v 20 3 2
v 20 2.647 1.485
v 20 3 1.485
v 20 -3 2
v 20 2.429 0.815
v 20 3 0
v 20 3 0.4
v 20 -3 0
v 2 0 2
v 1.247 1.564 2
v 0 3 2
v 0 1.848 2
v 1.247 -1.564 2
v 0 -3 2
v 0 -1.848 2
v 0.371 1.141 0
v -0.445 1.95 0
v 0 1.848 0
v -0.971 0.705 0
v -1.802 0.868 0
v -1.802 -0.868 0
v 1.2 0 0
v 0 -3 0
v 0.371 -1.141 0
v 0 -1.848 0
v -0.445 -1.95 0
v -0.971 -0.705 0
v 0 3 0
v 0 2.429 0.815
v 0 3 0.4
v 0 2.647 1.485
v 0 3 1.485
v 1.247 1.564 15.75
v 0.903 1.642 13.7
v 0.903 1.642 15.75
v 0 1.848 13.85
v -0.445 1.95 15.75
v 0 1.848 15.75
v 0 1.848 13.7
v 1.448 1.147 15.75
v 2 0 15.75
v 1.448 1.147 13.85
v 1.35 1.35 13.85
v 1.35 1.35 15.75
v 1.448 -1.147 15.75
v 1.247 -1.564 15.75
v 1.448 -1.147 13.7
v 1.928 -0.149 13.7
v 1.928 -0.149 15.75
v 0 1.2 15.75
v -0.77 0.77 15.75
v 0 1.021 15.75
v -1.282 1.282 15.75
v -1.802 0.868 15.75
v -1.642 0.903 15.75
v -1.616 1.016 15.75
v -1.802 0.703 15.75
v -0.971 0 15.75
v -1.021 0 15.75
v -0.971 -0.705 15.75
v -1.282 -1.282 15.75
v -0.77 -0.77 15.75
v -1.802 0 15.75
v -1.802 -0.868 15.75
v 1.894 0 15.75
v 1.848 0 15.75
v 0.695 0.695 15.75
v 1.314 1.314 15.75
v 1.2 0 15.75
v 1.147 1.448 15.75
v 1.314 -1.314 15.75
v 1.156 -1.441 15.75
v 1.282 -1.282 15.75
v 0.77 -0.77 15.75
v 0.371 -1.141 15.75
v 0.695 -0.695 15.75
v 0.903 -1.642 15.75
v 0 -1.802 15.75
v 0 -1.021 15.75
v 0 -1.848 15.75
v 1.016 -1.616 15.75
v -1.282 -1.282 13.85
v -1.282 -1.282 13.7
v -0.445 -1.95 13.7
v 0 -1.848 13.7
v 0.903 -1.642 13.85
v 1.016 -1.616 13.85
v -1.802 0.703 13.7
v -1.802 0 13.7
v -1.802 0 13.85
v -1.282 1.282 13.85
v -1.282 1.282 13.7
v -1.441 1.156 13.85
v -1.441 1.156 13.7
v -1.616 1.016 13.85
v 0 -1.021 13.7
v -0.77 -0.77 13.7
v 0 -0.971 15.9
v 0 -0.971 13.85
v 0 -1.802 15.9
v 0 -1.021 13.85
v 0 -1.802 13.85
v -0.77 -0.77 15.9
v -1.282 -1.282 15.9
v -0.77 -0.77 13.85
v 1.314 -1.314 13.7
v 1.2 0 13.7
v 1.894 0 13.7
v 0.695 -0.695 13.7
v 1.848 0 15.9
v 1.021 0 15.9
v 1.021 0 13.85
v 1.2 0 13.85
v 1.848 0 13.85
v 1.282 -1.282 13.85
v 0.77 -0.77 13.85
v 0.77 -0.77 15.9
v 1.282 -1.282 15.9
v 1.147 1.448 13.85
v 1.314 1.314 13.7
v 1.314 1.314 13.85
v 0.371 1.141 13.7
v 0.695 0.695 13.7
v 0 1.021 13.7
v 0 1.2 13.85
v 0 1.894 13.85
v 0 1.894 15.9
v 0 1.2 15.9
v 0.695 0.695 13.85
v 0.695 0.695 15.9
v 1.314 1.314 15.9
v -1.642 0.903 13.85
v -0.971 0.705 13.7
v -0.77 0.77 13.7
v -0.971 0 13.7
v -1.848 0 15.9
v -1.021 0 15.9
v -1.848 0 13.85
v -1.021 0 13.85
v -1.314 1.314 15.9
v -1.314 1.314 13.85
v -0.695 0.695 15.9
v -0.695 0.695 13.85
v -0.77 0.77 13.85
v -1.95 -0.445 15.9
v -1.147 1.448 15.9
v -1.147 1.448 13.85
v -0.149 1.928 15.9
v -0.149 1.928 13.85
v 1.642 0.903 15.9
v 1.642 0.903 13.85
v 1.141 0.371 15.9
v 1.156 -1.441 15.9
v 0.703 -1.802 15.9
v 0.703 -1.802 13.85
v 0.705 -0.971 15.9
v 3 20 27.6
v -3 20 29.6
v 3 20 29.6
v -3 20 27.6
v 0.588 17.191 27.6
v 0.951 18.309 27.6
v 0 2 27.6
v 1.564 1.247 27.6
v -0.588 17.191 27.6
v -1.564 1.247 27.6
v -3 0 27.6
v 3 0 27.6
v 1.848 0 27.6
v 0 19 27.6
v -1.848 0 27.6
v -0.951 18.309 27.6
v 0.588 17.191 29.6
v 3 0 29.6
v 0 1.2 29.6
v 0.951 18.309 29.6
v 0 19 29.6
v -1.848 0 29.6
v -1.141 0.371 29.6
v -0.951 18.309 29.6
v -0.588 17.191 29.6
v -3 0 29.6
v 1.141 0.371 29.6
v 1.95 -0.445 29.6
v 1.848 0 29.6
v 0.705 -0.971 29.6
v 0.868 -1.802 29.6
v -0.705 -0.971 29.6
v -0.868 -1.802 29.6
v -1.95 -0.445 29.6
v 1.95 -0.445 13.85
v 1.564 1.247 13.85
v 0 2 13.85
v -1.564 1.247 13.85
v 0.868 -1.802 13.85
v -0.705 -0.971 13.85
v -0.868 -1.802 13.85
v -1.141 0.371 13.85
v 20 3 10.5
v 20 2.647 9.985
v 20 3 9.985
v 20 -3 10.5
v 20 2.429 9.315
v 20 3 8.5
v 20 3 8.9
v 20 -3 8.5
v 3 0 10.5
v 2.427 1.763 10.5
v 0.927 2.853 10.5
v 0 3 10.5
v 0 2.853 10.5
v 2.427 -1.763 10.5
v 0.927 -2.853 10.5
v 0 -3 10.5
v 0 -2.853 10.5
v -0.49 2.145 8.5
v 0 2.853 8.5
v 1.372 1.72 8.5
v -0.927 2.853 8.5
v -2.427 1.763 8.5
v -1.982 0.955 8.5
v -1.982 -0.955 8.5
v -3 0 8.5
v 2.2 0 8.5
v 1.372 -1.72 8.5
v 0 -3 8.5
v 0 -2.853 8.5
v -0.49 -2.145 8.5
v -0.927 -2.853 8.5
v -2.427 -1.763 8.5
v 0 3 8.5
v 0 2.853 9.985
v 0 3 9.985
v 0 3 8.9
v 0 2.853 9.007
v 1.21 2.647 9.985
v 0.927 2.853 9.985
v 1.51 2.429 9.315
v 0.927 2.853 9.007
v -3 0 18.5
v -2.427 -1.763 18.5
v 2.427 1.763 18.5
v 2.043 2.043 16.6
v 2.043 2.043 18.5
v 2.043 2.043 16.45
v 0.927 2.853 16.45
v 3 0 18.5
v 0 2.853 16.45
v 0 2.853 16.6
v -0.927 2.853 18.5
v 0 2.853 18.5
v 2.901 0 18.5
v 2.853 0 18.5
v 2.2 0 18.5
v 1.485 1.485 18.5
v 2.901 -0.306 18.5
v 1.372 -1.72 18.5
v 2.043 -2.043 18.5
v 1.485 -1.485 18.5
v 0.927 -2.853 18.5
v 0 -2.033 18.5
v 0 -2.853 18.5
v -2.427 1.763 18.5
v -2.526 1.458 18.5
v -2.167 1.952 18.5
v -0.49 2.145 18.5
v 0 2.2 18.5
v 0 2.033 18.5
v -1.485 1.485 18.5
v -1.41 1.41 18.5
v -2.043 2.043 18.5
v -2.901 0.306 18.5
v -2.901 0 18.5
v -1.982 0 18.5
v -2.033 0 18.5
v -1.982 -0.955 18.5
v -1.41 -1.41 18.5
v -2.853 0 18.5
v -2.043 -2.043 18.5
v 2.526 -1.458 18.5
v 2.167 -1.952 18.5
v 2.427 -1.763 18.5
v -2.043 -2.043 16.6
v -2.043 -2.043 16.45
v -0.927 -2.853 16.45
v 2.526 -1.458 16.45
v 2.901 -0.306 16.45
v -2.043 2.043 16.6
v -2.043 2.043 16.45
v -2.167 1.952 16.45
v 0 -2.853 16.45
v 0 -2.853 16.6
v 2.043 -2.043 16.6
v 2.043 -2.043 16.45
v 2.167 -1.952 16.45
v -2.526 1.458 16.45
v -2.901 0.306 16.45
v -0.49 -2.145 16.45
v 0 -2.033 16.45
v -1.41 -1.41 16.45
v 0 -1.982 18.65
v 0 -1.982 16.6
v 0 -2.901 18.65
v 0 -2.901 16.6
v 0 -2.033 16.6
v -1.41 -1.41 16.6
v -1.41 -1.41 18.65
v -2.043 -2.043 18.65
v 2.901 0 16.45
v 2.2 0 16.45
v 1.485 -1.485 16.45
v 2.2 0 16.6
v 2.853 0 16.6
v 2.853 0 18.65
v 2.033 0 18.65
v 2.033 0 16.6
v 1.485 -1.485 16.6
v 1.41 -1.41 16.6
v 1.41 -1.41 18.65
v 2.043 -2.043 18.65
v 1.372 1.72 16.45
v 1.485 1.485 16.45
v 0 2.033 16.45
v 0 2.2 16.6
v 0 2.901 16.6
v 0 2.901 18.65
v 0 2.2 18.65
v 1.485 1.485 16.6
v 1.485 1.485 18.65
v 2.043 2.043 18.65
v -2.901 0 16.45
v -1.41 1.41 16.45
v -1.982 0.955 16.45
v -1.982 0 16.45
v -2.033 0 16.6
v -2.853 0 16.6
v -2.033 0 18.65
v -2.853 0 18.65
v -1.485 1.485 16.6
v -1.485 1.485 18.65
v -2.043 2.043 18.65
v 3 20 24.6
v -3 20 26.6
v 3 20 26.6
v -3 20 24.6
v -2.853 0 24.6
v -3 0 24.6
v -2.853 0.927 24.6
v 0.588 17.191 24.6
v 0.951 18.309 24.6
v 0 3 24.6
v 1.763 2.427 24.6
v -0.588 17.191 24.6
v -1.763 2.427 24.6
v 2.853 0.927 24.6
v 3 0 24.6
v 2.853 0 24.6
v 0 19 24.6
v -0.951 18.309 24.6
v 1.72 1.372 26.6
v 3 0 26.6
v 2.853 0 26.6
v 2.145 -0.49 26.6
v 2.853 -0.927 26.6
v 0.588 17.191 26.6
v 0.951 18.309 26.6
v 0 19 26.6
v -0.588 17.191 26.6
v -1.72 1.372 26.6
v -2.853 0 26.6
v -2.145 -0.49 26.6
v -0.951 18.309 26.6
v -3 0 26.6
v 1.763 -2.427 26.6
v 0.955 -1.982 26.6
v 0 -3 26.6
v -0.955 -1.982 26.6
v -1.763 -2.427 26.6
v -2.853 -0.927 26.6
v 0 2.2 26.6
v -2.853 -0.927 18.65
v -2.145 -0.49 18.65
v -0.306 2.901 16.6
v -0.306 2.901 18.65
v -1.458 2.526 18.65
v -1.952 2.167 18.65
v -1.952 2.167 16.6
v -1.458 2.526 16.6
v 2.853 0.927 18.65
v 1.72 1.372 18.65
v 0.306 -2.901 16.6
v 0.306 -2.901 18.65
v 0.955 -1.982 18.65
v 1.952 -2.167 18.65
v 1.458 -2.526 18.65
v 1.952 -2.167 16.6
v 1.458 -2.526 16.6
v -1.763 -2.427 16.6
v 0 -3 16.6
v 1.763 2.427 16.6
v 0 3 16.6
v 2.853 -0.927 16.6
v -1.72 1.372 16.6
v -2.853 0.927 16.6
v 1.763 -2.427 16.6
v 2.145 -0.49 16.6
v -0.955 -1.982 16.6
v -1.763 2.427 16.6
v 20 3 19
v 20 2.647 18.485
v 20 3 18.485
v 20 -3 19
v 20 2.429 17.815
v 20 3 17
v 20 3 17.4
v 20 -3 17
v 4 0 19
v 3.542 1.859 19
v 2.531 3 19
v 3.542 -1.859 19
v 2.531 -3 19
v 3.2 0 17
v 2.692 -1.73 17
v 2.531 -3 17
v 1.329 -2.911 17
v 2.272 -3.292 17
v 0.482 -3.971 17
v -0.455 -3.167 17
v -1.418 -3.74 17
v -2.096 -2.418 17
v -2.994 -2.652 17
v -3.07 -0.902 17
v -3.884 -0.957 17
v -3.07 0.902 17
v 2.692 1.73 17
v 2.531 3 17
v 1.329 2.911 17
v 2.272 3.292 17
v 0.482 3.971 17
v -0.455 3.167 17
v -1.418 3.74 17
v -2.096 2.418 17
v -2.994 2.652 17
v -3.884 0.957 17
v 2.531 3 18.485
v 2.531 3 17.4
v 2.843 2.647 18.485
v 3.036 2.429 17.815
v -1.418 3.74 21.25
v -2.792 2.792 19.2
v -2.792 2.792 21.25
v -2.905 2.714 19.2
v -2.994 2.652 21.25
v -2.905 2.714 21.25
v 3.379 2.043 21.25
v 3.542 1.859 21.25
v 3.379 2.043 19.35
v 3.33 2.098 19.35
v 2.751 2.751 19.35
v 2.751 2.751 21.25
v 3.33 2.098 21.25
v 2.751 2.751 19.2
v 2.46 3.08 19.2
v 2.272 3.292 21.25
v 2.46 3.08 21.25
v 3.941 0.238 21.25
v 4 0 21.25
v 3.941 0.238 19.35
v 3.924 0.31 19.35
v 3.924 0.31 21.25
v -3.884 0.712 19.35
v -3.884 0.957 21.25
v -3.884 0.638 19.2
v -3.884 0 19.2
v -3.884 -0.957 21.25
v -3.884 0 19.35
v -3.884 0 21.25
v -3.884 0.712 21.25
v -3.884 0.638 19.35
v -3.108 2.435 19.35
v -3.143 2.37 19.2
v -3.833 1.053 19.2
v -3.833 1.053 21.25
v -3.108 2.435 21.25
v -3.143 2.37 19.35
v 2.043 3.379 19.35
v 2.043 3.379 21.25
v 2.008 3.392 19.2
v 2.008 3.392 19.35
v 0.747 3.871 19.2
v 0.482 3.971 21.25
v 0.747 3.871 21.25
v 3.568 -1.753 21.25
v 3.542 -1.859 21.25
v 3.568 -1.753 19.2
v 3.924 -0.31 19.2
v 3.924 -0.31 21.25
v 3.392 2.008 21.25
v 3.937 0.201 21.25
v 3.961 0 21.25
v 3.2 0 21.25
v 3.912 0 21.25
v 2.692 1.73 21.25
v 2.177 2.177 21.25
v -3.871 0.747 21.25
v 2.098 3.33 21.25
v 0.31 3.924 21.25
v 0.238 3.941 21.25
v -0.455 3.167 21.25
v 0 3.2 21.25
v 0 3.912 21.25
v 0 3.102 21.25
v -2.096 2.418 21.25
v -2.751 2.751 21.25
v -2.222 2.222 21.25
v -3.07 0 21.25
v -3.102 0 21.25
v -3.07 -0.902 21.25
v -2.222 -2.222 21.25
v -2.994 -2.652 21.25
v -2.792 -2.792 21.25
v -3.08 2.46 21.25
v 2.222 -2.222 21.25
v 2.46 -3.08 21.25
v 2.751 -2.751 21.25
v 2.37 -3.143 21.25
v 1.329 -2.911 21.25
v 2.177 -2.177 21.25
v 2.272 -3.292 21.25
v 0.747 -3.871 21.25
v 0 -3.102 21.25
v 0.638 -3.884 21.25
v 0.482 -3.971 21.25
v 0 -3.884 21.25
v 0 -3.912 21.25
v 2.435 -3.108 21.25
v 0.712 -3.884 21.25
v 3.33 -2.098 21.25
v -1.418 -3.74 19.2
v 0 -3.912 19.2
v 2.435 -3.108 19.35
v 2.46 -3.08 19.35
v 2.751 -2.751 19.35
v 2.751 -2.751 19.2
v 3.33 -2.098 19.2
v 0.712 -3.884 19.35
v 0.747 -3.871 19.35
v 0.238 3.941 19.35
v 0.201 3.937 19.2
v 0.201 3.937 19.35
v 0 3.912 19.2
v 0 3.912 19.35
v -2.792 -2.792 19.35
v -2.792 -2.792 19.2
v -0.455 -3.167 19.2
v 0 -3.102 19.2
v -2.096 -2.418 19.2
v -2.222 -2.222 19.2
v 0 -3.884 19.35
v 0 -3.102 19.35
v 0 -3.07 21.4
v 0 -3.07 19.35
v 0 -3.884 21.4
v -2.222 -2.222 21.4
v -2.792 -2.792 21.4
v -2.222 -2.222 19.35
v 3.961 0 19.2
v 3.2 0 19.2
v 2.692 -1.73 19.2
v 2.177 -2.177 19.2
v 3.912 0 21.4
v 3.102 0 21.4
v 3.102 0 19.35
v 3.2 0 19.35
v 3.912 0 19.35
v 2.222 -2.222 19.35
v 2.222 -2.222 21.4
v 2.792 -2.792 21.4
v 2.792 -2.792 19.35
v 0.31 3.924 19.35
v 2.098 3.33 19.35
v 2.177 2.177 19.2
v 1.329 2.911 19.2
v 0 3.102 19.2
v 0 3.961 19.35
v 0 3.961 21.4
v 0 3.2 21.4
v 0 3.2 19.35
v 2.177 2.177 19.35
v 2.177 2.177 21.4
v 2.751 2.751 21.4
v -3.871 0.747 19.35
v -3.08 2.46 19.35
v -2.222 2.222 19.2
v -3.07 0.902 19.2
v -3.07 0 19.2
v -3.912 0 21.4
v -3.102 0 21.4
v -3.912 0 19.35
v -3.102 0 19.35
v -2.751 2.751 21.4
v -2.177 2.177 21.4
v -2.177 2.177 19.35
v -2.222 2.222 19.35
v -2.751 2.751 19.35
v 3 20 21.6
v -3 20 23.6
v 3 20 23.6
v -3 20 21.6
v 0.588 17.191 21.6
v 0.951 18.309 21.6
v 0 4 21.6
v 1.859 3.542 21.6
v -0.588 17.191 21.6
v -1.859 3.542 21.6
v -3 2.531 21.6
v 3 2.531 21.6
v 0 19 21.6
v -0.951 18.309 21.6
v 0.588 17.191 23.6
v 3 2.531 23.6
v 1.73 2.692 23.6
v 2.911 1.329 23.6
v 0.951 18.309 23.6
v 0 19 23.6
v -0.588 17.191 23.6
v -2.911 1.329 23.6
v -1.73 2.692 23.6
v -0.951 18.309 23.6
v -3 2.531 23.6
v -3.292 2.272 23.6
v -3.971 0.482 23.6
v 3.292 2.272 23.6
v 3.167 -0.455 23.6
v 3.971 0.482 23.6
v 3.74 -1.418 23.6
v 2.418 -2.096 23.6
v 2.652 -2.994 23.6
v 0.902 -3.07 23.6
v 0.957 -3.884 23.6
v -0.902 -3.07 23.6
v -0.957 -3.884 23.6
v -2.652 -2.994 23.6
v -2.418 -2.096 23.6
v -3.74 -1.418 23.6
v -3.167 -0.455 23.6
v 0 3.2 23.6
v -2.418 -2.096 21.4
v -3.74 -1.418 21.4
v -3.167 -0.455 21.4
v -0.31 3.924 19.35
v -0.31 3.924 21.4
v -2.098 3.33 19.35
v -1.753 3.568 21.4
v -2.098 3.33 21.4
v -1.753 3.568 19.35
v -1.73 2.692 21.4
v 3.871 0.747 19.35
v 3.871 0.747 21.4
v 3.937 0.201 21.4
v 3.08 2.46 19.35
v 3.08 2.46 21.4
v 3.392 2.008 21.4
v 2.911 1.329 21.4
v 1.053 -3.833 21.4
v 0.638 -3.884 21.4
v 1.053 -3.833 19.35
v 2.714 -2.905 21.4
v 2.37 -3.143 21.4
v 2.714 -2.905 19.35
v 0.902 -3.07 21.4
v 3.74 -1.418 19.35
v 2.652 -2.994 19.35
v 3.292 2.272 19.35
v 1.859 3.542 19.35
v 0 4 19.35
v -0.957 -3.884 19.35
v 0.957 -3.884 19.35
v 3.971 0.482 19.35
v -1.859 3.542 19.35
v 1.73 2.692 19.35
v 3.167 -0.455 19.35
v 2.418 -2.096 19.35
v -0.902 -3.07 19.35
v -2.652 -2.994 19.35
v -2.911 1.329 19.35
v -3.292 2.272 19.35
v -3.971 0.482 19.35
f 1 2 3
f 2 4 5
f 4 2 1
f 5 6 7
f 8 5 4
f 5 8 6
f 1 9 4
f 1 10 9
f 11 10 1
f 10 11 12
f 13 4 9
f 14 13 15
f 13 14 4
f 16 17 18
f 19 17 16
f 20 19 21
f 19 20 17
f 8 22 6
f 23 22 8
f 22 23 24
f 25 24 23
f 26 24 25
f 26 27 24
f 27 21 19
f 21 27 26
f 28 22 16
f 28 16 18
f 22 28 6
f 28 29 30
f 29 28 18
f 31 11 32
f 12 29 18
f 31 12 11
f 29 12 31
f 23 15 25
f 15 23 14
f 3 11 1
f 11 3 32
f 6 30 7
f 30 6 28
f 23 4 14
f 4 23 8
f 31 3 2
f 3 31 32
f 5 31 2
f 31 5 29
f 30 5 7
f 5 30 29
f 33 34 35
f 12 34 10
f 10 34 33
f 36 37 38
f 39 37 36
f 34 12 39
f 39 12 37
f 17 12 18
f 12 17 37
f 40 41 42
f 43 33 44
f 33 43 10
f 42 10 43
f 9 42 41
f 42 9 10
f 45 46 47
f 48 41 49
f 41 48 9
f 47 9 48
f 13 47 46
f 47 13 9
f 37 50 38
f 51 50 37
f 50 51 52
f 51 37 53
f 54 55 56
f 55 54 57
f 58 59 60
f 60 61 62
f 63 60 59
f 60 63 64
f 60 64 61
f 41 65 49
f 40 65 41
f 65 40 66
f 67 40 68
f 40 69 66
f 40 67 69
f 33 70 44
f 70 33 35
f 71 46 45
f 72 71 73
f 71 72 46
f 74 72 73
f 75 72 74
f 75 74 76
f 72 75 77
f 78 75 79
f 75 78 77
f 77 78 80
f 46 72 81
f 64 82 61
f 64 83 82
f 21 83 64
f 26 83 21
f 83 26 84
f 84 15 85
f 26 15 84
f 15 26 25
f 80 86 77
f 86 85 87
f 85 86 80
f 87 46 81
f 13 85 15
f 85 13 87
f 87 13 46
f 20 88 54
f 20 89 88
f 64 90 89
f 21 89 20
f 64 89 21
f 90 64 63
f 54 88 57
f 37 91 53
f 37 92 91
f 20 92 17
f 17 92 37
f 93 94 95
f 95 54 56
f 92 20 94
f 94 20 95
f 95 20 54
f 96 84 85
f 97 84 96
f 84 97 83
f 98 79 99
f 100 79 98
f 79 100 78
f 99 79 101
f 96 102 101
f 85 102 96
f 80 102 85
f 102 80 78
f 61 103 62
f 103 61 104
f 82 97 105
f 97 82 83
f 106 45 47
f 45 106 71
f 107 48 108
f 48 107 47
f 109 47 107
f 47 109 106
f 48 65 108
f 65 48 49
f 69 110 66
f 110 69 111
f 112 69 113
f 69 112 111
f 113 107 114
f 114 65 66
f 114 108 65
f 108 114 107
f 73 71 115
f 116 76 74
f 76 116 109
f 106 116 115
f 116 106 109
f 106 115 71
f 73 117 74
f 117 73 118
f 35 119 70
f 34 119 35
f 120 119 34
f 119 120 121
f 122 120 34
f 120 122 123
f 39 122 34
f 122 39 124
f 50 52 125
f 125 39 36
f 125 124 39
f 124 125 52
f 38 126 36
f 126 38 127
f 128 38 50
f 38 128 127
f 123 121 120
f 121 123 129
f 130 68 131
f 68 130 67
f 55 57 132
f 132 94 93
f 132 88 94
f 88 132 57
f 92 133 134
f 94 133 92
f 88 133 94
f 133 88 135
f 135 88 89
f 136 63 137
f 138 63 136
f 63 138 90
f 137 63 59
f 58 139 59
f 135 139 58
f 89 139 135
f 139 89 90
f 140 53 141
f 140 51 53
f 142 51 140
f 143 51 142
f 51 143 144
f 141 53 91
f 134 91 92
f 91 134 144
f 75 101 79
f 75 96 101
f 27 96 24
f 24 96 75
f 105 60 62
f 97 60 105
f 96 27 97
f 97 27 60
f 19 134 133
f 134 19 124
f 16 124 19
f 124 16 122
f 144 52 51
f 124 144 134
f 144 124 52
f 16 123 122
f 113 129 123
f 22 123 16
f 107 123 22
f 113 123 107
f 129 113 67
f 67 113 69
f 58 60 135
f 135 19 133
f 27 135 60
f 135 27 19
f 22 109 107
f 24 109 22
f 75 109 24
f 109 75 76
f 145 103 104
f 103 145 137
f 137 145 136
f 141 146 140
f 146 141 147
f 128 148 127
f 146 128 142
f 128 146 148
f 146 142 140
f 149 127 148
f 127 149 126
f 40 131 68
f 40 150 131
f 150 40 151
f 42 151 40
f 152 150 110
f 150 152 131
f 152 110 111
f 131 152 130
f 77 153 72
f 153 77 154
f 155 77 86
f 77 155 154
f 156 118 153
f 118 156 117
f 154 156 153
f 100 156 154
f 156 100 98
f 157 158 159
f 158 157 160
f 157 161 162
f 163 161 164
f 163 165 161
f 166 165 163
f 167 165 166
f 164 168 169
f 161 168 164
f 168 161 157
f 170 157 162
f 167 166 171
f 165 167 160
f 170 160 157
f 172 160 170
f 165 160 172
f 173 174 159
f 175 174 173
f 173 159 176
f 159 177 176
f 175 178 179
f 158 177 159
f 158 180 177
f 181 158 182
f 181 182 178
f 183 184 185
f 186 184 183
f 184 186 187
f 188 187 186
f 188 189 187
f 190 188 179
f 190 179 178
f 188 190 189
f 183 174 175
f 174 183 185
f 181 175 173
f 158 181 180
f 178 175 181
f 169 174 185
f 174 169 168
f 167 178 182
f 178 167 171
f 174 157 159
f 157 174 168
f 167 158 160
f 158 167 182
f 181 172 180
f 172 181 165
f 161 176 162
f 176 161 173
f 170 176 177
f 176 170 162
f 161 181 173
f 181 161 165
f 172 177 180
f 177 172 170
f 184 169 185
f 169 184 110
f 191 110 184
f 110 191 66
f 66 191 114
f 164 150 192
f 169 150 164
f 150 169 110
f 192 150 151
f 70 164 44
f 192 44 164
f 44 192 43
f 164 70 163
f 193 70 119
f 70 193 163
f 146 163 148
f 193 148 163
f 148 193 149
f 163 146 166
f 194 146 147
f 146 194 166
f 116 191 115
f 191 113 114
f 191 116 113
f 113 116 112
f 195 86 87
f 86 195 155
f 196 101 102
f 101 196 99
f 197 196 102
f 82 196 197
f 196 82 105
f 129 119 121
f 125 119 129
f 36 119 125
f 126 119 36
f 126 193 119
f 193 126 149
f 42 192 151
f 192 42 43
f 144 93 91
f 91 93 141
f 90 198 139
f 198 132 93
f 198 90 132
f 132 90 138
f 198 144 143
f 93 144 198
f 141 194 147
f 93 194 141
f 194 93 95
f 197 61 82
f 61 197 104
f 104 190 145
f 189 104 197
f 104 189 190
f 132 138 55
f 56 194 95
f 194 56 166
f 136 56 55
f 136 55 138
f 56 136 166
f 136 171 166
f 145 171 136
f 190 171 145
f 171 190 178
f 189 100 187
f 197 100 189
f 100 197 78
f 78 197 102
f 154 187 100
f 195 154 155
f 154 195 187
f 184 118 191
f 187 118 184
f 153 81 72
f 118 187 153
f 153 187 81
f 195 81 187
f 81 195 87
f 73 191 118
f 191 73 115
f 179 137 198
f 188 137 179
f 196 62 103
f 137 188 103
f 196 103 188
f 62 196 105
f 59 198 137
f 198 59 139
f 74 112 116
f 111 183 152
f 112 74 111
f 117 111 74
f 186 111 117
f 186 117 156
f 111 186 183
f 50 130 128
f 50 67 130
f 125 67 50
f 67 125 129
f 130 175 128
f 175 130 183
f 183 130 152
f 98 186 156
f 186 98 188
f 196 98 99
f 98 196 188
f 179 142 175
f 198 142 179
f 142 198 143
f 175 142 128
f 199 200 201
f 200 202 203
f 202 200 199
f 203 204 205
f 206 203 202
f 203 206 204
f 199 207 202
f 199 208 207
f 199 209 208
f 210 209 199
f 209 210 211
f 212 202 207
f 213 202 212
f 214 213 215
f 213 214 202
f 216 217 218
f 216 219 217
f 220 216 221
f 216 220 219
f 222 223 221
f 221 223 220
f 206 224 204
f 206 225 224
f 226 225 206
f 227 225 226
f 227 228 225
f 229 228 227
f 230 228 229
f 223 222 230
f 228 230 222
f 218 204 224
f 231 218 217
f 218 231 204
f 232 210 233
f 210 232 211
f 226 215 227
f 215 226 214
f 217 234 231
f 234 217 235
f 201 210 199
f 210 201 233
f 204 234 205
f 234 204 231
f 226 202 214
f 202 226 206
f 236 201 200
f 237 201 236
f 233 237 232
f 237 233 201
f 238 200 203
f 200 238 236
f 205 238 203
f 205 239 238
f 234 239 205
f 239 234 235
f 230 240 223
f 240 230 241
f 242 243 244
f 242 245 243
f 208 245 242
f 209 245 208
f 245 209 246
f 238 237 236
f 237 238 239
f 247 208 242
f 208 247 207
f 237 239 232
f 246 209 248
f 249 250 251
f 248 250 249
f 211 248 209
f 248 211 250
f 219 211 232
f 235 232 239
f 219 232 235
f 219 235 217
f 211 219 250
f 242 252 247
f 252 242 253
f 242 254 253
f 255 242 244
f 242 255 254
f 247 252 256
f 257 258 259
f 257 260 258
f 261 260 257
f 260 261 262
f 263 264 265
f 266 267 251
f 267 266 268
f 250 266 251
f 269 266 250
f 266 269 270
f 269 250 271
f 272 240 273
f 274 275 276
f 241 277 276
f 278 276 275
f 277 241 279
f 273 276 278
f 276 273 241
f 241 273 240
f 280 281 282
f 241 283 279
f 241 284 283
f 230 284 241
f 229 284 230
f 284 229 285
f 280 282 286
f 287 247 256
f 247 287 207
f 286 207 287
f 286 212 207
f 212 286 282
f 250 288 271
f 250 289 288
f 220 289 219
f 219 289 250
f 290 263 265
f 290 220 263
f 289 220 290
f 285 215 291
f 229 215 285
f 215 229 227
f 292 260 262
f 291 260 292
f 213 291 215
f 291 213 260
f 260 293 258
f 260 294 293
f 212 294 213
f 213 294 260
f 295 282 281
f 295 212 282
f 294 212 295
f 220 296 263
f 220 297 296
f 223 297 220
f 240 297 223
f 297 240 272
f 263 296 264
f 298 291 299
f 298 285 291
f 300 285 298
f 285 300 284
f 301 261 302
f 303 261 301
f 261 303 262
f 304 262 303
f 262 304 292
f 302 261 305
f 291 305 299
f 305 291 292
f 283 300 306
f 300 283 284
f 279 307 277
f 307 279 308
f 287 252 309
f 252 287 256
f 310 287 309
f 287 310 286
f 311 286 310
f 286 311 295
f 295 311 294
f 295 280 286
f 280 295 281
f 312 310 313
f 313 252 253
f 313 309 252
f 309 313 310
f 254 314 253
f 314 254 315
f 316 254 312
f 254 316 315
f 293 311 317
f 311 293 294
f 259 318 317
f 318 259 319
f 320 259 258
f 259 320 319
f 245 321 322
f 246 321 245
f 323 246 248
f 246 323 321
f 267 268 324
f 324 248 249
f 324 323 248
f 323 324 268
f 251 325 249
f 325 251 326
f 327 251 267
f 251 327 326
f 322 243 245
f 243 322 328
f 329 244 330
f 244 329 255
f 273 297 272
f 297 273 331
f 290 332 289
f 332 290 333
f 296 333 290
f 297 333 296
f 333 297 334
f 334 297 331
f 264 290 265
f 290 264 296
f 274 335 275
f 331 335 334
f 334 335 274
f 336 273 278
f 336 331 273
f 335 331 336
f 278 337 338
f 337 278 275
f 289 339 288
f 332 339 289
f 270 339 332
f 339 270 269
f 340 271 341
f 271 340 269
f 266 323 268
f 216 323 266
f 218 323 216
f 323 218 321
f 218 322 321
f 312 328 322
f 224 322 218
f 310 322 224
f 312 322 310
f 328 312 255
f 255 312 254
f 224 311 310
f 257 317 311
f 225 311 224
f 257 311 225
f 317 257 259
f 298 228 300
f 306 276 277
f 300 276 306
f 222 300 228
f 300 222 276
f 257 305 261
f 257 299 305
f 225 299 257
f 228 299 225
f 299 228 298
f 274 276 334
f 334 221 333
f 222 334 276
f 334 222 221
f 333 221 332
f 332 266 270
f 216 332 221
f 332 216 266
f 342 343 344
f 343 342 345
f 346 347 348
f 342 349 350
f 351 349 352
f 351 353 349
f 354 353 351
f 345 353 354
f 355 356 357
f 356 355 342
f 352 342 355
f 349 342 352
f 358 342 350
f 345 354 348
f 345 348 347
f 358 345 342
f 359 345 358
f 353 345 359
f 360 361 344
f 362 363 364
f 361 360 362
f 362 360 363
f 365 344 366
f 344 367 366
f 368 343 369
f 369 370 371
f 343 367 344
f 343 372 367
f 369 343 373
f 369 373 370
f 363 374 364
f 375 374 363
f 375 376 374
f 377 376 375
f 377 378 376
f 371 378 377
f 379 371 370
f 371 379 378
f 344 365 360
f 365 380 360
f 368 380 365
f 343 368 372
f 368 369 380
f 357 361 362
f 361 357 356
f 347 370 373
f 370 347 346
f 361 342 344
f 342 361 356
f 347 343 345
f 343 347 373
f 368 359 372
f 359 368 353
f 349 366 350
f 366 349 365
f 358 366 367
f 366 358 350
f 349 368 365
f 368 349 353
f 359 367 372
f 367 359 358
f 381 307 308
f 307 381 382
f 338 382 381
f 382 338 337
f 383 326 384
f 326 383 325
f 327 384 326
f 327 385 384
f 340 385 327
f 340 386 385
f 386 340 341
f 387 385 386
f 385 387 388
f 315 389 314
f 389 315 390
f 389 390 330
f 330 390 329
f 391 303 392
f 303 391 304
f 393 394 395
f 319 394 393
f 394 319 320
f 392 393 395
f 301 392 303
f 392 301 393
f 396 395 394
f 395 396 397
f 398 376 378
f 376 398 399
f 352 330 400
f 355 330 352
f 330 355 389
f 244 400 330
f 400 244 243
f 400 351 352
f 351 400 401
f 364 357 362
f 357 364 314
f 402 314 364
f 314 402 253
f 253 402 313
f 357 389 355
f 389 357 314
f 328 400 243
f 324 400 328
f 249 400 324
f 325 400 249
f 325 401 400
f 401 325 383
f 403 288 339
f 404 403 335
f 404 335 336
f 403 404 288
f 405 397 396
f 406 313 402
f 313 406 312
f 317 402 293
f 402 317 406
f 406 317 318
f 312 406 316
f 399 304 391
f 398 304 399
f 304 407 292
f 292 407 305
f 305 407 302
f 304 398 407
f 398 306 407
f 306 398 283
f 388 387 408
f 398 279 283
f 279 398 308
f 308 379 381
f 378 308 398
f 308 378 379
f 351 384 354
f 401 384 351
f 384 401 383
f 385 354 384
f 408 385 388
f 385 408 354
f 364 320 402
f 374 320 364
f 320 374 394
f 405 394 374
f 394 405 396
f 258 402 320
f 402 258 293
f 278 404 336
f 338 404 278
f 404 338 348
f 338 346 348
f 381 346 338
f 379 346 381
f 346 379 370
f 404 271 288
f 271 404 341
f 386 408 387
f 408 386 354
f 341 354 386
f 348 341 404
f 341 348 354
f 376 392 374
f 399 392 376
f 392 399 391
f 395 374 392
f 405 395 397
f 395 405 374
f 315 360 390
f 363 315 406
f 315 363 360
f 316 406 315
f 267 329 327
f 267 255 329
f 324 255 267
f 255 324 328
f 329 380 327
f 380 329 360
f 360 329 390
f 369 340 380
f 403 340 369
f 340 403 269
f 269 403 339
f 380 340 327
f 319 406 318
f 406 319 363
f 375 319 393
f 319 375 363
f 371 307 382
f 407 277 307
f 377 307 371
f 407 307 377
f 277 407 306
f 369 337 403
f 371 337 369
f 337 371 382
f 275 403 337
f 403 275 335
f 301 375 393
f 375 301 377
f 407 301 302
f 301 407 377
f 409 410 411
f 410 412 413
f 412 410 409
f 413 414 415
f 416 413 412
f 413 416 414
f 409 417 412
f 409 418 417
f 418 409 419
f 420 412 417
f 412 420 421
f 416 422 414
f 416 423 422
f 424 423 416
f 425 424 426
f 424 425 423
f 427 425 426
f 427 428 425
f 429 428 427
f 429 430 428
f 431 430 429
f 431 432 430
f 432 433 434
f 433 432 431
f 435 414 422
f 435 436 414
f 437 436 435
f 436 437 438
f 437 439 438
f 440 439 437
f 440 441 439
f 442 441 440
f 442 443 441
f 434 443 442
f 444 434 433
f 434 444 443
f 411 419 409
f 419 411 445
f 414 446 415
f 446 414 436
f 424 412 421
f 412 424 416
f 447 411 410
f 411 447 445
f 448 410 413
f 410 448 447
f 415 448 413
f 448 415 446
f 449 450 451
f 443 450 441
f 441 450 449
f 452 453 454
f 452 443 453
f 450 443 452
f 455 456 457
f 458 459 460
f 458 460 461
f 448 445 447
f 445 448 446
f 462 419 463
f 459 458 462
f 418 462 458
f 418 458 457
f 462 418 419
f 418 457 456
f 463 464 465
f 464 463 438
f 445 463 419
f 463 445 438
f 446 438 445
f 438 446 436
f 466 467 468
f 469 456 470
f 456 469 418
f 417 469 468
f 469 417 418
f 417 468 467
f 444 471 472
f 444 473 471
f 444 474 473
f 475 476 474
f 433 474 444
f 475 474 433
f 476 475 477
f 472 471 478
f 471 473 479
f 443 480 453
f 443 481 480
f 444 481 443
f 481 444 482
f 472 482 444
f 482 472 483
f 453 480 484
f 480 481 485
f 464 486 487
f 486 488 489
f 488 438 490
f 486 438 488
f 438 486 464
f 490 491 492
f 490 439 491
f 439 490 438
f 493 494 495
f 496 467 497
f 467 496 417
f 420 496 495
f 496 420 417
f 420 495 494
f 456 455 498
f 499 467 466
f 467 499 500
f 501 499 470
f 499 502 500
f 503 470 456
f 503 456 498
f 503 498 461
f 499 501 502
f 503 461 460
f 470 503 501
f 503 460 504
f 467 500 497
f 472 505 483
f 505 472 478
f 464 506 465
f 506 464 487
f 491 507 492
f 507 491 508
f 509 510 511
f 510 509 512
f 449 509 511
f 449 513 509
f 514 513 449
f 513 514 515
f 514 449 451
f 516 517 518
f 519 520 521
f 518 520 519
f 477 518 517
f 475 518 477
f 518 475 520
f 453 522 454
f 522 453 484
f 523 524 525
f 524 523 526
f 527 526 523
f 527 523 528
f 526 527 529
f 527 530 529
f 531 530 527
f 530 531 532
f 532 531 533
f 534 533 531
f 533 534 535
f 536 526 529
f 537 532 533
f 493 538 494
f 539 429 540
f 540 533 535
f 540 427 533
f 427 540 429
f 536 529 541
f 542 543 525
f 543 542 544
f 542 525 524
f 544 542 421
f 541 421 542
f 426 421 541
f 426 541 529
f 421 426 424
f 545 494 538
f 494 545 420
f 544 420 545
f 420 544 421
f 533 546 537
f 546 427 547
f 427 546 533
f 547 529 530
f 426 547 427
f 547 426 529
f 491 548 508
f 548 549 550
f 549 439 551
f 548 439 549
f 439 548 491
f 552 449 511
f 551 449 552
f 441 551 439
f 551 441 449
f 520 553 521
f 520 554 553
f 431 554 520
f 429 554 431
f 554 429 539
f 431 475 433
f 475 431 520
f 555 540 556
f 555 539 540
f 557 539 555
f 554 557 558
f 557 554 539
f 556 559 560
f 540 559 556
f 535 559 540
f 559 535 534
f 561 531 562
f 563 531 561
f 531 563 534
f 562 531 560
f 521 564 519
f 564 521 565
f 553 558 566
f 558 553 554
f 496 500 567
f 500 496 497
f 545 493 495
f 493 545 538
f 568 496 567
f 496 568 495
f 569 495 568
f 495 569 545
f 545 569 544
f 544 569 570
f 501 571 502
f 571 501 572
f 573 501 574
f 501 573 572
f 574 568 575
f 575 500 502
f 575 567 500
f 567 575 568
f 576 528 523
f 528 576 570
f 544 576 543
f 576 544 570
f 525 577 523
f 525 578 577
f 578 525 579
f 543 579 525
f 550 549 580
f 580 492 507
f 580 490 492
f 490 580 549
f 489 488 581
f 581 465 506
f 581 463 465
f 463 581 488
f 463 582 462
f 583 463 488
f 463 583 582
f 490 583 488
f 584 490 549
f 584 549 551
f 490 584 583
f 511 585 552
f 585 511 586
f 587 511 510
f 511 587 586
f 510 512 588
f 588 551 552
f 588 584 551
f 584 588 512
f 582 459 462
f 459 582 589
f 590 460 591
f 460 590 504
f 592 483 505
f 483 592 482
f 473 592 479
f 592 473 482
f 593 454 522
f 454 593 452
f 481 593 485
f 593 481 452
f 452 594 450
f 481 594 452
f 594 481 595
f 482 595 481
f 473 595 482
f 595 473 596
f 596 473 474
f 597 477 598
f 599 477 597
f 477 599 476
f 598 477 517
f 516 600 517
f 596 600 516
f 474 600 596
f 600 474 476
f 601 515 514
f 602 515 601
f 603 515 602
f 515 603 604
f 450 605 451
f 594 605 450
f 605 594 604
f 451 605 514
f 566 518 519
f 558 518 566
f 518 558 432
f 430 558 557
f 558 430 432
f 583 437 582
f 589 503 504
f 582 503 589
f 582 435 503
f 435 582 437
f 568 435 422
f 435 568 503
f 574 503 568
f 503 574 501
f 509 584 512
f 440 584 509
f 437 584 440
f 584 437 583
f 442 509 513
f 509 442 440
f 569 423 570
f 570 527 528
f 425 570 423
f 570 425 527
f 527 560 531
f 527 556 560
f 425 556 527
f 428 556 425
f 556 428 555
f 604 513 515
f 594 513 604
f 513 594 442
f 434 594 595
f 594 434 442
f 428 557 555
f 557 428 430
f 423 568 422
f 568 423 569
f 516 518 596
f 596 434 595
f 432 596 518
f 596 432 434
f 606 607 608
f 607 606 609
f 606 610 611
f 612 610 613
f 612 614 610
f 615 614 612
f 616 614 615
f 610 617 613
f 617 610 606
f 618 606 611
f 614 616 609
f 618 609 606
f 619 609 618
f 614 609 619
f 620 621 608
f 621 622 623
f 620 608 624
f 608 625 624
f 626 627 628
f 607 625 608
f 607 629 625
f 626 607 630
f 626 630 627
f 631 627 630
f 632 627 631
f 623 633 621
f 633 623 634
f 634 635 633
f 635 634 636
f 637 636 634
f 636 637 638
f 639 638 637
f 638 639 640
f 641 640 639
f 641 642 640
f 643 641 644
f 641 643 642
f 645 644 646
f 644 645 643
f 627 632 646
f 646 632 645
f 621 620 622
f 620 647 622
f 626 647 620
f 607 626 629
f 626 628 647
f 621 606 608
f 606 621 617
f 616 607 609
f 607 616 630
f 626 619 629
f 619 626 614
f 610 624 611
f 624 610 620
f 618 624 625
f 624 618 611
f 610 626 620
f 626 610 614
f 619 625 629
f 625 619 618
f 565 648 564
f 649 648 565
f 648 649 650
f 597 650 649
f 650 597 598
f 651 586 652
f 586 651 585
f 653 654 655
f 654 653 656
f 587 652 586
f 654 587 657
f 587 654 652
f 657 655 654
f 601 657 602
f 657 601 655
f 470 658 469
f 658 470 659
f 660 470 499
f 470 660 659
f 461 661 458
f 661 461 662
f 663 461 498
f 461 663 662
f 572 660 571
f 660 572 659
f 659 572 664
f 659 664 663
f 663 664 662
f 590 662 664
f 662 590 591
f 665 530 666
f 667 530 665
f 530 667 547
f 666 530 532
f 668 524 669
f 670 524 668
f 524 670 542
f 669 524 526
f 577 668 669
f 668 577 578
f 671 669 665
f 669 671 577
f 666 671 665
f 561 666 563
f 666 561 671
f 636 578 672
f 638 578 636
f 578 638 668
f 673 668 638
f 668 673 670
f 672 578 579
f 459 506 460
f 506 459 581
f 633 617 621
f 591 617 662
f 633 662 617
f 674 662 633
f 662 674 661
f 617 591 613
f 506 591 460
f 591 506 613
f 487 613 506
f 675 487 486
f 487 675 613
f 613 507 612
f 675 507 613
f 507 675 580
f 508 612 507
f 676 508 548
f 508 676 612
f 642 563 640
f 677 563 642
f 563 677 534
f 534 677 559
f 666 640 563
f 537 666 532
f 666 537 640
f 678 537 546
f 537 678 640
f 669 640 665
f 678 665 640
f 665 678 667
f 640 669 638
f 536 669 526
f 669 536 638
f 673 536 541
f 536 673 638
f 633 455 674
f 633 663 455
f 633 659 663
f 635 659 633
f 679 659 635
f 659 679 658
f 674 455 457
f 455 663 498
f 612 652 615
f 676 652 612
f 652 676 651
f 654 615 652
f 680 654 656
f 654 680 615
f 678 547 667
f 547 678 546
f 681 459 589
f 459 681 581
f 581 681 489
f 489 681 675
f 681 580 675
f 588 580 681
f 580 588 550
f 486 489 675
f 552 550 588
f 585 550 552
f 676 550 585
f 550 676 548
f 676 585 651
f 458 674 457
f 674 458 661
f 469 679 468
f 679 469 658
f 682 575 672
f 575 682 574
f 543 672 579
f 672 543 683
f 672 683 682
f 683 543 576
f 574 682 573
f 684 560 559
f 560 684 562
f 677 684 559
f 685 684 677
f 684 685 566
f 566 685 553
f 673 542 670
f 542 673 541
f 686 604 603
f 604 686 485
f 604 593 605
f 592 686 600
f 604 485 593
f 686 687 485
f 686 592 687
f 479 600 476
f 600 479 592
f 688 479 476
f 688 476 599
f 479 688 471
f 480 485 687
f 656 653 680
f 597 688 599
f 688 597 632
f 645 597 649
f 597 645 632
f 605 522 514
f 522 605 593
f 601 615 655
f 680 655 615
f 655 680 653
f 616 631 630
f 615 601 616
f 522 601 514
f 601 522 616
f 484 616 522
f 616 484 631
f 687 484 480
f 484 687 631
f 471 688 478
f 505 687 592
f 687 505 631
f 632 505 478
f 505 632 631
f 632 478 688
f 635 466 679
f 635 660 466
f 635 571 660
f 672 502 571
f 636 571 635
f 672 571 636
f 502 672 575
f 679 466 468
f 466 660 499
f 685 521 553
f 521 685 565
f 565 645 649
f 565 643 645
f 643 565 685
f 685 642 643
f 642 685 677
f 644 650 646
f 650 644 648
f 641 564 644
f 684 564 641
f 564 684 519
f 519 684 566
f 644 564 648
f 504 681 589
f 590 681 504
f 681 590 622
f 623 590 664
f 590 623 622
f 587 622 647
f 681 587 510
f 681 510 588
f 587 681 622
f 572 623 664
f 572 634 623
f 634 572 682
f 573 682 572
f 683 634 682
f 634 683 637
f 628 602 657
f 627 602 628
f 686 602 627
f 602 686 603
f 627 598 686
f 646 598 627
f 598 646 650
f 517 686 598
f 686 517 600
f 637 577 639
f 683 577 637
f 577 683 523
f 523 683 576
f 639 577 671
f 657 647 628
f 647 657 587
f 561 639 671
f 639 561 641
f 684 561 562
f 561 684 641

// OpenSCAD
e= 2; // epaisseur
d0 = e ; // diametre de base
d_doigt= 20; // longueur doigt
l_doigt = 6 ; // largeur doigt
d_corde = 1.2; // diametre cordes
l_cordes_0 = 17 ; // 43 ;
l_cordes_1 = 18; //51 ;

nbcorde = 3 ; // nombre de cordes
entre_corde = l_cordes_0/(nbcorde-1); // espace entre deux cordes
d_entre_corde = (l_cordes_1/(nbcorde-1) - entre_corde)/10;// increment espace entre deux cordes
d_tirette = 2 ; // diametre trou tirette

module huitieme_cercle(d)
{
     difference()
    {
        cylinder(h=e+0.1 ,d = d, center = true);
        translate([d/2,0,0]) cube([d,d,e+0.2],center=true);
        rotate([0,0,45]) translate([0,d/2,0]) cube([d,d,e+0.2],center=true);
    }
}
module etoile(d, v)
{
   for(i=[0:4])
   {
        rotate([0,0, 90*i + 45*v ])
            huitieme_cercle(d+0.1);
   }
}

module doigt(l,d_ext,d_int, corde)
{
    difference()
    {
        union()
        {
            // tube principale
            cylinder(h=l, d=d_ext, center = false);
            // doigt
            translate([d_doigt/2,0,e/2])
                difference()
                {
                    cube([d_doigt,l_doigt,e],center=true);
                    if ( corde == true )
                    {
                        // encoche corde
                        translate([0,l_doigt/2,0]) 
                            rotate([0,90,0]) 
                            cylinder(h=d_doigt,d=d_corde,center = true);
                    }
                    else
                    {
                        translate([d_doigt/2- d_tirette,0,0]) 
                            cylinder(h=2*d_doigt,d=d_tirette,center = true);
                    }
                }
        }
        // trou pour l'axe
        cylinder(h=l, d=d_int, center = false);
        //assemblage
        translate([0,0,l-e/2]) etoile(d_ext, 0);
    }
}

module doit_fourchette(l,d_ext,d_int)
{
    doigt(l/2,d_ext,d_int,true);
    translate([0,0,l-e+0.1]) rotate([0,180,-90]) 
        doigt(l/2,d_ext,d_int,false);
}
for(i=[0:nbcorde - 1])
{
    translate([0,0, entre_corde * i])
        doit_fourchette(entre_corde * (nbcorde) - i*entre_corde + (nbcorde -1 -i)*(e+1) ,d0 *( i +2) ,d0 * (i + 1) + 0.4);
}
